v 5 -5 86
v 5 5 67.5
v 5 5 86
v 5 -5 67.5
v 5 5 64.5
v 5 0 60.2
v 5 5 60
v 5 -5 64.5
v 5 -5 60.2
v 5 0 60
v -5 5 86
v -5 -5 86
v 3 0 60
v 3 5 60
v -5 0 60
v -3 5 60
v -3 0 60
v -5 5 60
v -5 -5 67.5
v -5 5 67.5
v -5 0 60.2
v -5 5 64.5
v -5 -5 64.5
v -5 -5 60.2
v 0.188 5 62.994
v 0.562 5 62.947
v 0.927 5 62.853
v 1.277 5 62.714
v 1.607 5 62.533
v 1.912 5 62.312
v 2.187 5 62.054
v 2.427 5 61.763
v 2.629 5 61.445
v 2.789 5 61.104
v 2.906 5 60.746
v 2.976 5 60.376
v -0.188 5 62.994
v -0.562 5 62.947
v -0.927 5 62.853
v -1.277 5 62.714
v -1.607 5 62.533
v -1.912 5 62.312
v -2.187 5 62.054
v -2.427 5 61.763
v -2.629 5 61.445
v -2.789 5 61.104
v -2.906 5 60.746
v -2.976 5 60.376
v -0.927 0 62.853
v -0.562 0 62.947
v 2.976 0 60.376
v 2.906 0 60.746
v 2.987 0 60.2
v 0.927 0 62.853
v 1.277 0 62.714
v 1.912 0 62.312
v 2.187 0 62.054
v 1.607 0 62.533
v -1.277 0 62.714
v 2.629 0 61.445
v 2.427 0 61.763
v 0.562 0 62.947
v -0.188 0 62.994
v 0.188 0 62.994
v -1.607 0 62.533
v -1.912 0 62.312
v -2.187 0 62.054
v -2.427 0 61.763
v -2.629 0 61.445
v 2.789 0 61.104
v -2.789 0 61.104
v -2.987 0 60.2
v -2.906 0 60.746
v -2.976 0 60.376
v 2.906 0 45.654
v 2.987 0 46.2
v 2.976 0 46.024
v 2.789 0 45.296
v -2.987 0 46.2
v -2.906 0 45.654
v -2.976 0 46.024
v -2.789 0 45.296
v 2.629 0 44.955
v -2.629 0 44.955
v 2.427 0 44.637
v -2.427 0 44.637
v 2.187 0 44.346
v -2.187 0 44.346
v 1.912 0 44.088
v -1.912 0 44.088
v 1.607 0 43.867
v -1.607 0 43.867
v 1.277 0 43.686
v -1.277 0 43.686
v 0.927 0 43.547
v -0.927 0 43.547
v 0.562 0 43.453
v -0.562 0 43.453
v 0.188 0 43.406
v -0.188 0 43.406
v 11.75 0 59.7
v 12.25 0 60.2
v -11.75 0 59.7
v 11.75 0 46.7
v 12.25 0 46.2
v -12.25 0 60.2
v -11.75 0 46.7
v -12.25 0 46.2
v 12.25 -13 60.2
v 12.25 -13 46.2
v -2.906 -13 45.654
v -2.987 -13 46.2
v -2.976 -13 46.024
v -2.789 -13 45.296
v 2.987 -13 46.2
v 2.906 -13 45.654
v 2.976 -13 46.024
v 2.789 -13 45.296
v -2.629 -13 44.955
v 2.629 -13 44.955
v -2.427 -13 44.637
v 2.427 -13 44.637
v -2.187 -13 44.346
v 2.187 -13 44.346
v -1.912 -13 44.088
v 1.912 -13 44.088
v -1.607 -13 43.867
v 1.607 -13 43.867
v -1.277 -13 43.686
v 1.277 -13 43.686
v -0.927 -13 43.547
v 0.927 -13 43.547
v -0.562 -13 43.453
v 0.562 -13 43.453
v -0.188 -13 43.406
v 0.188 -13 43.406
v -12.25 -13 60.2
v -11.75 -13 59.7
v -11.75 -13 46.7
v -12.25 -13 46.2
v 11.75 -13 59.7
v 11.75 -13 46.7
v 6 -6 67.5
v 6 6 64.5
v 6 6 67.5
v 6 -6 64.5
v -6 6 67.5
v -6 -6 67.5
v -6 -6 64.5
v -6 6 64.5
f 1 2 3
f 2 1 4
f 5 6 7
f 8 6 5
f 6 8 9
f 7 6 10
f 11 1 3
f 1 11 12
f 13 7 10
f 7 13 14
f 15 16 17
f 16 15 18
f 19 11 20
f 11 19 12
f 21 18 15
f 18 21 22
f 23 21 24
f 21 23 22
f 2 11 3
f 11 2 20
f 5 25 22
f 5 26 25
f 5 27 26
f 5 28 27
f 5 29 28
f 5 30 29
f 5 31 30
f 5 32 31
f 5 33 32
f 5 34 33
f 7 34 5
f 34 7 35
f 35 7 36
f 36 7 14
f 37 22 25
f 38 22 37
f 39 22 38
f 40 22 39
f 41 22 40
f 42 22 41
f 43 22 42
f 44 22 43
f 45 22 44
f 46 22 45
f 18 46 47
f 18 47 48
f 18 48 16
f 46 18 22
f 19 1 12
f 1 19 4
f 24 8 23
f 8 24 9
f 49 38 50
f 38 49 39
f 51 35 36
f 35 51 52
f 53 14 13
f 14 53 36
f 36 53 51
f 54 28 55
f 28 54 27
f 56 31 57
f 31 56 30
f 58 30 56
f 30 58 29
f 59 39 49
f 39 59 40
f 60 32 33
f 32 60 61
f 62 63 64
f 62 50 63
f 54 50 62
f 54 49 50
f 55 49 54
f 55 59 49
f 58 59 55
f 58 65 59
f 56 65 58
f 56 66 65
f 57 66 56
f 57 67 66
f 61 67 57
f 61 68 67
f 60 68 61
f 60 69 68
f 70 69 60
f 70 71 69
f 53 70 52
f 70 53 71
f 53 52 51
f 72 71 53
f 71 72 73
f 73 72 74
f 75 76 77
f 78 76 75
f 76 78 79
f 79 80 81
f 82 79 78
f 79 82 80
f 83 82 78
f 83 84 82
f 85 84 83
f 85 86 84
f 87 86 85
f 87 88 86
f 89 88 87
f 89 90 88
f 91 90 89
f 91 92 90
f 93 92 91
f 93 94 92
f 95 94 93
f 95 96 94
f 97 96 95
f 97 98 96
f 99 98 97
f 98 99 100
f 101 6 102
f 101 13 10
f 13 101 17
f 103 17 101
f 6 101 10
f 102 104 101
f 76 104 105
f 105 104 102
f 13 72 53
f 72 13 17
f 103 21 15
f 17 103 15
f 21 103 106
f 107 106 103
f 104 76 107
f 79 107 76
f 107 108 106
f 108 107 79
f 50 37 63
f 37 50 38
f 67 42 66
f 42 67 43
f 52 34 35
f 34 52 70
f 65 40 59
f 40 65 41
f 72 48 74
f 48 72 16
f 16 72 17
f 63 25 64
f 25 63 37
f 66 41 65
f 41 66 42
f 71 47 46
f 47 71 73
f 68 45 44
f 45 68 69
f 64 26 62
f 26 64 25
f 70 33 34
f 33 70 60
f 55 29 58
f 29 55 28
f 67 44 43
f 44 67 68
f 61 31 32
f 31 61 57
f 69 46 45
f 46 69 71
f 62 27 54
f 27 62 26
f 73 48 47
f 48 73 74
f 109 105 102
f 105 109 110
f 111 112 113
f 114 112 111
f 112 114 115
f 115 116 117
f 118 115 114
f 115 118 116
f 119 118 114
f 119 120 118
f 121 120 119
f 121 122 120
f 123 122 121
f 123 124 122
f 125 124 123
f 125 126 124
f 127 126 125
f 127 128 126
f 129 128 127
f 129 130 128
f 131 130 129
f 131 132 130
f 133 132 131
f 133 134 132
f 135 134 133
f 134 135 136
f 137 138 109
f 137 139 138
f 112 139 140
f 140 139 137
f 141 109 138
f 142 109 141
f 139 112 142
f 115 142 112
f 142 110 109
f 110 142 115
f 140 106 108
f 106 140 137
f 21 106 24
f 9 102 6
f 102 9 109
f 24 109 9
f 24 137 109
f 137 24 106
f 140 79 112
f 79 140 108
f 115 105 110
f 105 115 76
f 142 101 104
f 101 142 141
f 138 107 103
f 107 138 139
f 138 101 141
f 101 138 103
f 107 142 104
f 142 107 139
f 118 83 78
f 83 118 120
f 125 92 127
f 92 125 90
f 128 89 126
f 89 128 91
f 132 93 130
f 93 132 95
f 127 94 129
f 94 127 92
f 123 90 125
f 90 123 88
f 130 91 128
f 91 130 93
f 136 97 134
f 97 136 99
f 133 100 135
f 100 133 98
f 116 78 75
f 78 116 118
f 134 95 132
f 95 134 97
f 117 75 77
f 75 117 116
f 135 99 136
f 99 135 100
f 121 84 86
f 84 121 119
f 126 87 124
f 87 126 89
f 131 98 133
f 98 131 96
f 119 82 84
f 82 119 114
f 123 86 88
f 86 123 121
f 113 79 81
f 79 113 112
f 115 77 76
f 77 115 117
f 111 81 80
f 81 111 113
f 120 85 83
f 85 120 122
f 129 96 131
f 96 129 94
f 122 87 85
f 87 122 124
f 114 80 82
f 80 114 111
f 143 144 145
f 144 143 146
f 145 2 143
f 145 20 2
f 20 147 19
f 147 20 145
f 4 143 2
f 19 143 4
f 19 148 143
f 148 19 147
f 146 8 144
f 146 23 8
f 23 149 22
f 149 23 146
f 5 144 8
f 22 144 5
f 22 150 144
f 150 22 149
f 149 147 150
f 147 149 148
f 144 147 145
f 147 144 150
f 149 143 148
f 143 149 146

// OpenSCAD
// file: servo_holder.scad
servo_x = 23;
servo_y = 12.5;
servo_z = 13;

servo_x_offset = servo_x/2 - 6;

servo_x_clearance = 0.5;
servo_y_clearance = 0.5;

wall_thickness = 1;



translate([0,0,servo_z/2])
difference(){
    cube([
        servo_x+servo_x_clearance+wall_thickness, 
        servo_y+servo_y_clearance+wall_thickness,
        servo_z], center=true);
    cube([
        servo_x+servo_x_clearance, 
        servo_y+servo_y_clearance,
        servo_z+1], center=true);
}
// main file
$fn=50;

translate([0,0,66])
cube([12,12,3], center=true);


difference(){
translate([0,0,60 + 26/2])
cube([10,10,26], center=true);
    translate([0,6,60])
rotate([90,0,0])
cylinder(d=6, 6);
}

translate([0,0,53.2])
rotate([90,0,0]){
include<servo_holder.scad>
}

translate([0,0,46.4]){
    difference(){
        rotate([90,0,0]){
            cylinder(d=6, 13);
        }
        translate([-3,-50,0])
        cube([6,100,6]);
    }
}
